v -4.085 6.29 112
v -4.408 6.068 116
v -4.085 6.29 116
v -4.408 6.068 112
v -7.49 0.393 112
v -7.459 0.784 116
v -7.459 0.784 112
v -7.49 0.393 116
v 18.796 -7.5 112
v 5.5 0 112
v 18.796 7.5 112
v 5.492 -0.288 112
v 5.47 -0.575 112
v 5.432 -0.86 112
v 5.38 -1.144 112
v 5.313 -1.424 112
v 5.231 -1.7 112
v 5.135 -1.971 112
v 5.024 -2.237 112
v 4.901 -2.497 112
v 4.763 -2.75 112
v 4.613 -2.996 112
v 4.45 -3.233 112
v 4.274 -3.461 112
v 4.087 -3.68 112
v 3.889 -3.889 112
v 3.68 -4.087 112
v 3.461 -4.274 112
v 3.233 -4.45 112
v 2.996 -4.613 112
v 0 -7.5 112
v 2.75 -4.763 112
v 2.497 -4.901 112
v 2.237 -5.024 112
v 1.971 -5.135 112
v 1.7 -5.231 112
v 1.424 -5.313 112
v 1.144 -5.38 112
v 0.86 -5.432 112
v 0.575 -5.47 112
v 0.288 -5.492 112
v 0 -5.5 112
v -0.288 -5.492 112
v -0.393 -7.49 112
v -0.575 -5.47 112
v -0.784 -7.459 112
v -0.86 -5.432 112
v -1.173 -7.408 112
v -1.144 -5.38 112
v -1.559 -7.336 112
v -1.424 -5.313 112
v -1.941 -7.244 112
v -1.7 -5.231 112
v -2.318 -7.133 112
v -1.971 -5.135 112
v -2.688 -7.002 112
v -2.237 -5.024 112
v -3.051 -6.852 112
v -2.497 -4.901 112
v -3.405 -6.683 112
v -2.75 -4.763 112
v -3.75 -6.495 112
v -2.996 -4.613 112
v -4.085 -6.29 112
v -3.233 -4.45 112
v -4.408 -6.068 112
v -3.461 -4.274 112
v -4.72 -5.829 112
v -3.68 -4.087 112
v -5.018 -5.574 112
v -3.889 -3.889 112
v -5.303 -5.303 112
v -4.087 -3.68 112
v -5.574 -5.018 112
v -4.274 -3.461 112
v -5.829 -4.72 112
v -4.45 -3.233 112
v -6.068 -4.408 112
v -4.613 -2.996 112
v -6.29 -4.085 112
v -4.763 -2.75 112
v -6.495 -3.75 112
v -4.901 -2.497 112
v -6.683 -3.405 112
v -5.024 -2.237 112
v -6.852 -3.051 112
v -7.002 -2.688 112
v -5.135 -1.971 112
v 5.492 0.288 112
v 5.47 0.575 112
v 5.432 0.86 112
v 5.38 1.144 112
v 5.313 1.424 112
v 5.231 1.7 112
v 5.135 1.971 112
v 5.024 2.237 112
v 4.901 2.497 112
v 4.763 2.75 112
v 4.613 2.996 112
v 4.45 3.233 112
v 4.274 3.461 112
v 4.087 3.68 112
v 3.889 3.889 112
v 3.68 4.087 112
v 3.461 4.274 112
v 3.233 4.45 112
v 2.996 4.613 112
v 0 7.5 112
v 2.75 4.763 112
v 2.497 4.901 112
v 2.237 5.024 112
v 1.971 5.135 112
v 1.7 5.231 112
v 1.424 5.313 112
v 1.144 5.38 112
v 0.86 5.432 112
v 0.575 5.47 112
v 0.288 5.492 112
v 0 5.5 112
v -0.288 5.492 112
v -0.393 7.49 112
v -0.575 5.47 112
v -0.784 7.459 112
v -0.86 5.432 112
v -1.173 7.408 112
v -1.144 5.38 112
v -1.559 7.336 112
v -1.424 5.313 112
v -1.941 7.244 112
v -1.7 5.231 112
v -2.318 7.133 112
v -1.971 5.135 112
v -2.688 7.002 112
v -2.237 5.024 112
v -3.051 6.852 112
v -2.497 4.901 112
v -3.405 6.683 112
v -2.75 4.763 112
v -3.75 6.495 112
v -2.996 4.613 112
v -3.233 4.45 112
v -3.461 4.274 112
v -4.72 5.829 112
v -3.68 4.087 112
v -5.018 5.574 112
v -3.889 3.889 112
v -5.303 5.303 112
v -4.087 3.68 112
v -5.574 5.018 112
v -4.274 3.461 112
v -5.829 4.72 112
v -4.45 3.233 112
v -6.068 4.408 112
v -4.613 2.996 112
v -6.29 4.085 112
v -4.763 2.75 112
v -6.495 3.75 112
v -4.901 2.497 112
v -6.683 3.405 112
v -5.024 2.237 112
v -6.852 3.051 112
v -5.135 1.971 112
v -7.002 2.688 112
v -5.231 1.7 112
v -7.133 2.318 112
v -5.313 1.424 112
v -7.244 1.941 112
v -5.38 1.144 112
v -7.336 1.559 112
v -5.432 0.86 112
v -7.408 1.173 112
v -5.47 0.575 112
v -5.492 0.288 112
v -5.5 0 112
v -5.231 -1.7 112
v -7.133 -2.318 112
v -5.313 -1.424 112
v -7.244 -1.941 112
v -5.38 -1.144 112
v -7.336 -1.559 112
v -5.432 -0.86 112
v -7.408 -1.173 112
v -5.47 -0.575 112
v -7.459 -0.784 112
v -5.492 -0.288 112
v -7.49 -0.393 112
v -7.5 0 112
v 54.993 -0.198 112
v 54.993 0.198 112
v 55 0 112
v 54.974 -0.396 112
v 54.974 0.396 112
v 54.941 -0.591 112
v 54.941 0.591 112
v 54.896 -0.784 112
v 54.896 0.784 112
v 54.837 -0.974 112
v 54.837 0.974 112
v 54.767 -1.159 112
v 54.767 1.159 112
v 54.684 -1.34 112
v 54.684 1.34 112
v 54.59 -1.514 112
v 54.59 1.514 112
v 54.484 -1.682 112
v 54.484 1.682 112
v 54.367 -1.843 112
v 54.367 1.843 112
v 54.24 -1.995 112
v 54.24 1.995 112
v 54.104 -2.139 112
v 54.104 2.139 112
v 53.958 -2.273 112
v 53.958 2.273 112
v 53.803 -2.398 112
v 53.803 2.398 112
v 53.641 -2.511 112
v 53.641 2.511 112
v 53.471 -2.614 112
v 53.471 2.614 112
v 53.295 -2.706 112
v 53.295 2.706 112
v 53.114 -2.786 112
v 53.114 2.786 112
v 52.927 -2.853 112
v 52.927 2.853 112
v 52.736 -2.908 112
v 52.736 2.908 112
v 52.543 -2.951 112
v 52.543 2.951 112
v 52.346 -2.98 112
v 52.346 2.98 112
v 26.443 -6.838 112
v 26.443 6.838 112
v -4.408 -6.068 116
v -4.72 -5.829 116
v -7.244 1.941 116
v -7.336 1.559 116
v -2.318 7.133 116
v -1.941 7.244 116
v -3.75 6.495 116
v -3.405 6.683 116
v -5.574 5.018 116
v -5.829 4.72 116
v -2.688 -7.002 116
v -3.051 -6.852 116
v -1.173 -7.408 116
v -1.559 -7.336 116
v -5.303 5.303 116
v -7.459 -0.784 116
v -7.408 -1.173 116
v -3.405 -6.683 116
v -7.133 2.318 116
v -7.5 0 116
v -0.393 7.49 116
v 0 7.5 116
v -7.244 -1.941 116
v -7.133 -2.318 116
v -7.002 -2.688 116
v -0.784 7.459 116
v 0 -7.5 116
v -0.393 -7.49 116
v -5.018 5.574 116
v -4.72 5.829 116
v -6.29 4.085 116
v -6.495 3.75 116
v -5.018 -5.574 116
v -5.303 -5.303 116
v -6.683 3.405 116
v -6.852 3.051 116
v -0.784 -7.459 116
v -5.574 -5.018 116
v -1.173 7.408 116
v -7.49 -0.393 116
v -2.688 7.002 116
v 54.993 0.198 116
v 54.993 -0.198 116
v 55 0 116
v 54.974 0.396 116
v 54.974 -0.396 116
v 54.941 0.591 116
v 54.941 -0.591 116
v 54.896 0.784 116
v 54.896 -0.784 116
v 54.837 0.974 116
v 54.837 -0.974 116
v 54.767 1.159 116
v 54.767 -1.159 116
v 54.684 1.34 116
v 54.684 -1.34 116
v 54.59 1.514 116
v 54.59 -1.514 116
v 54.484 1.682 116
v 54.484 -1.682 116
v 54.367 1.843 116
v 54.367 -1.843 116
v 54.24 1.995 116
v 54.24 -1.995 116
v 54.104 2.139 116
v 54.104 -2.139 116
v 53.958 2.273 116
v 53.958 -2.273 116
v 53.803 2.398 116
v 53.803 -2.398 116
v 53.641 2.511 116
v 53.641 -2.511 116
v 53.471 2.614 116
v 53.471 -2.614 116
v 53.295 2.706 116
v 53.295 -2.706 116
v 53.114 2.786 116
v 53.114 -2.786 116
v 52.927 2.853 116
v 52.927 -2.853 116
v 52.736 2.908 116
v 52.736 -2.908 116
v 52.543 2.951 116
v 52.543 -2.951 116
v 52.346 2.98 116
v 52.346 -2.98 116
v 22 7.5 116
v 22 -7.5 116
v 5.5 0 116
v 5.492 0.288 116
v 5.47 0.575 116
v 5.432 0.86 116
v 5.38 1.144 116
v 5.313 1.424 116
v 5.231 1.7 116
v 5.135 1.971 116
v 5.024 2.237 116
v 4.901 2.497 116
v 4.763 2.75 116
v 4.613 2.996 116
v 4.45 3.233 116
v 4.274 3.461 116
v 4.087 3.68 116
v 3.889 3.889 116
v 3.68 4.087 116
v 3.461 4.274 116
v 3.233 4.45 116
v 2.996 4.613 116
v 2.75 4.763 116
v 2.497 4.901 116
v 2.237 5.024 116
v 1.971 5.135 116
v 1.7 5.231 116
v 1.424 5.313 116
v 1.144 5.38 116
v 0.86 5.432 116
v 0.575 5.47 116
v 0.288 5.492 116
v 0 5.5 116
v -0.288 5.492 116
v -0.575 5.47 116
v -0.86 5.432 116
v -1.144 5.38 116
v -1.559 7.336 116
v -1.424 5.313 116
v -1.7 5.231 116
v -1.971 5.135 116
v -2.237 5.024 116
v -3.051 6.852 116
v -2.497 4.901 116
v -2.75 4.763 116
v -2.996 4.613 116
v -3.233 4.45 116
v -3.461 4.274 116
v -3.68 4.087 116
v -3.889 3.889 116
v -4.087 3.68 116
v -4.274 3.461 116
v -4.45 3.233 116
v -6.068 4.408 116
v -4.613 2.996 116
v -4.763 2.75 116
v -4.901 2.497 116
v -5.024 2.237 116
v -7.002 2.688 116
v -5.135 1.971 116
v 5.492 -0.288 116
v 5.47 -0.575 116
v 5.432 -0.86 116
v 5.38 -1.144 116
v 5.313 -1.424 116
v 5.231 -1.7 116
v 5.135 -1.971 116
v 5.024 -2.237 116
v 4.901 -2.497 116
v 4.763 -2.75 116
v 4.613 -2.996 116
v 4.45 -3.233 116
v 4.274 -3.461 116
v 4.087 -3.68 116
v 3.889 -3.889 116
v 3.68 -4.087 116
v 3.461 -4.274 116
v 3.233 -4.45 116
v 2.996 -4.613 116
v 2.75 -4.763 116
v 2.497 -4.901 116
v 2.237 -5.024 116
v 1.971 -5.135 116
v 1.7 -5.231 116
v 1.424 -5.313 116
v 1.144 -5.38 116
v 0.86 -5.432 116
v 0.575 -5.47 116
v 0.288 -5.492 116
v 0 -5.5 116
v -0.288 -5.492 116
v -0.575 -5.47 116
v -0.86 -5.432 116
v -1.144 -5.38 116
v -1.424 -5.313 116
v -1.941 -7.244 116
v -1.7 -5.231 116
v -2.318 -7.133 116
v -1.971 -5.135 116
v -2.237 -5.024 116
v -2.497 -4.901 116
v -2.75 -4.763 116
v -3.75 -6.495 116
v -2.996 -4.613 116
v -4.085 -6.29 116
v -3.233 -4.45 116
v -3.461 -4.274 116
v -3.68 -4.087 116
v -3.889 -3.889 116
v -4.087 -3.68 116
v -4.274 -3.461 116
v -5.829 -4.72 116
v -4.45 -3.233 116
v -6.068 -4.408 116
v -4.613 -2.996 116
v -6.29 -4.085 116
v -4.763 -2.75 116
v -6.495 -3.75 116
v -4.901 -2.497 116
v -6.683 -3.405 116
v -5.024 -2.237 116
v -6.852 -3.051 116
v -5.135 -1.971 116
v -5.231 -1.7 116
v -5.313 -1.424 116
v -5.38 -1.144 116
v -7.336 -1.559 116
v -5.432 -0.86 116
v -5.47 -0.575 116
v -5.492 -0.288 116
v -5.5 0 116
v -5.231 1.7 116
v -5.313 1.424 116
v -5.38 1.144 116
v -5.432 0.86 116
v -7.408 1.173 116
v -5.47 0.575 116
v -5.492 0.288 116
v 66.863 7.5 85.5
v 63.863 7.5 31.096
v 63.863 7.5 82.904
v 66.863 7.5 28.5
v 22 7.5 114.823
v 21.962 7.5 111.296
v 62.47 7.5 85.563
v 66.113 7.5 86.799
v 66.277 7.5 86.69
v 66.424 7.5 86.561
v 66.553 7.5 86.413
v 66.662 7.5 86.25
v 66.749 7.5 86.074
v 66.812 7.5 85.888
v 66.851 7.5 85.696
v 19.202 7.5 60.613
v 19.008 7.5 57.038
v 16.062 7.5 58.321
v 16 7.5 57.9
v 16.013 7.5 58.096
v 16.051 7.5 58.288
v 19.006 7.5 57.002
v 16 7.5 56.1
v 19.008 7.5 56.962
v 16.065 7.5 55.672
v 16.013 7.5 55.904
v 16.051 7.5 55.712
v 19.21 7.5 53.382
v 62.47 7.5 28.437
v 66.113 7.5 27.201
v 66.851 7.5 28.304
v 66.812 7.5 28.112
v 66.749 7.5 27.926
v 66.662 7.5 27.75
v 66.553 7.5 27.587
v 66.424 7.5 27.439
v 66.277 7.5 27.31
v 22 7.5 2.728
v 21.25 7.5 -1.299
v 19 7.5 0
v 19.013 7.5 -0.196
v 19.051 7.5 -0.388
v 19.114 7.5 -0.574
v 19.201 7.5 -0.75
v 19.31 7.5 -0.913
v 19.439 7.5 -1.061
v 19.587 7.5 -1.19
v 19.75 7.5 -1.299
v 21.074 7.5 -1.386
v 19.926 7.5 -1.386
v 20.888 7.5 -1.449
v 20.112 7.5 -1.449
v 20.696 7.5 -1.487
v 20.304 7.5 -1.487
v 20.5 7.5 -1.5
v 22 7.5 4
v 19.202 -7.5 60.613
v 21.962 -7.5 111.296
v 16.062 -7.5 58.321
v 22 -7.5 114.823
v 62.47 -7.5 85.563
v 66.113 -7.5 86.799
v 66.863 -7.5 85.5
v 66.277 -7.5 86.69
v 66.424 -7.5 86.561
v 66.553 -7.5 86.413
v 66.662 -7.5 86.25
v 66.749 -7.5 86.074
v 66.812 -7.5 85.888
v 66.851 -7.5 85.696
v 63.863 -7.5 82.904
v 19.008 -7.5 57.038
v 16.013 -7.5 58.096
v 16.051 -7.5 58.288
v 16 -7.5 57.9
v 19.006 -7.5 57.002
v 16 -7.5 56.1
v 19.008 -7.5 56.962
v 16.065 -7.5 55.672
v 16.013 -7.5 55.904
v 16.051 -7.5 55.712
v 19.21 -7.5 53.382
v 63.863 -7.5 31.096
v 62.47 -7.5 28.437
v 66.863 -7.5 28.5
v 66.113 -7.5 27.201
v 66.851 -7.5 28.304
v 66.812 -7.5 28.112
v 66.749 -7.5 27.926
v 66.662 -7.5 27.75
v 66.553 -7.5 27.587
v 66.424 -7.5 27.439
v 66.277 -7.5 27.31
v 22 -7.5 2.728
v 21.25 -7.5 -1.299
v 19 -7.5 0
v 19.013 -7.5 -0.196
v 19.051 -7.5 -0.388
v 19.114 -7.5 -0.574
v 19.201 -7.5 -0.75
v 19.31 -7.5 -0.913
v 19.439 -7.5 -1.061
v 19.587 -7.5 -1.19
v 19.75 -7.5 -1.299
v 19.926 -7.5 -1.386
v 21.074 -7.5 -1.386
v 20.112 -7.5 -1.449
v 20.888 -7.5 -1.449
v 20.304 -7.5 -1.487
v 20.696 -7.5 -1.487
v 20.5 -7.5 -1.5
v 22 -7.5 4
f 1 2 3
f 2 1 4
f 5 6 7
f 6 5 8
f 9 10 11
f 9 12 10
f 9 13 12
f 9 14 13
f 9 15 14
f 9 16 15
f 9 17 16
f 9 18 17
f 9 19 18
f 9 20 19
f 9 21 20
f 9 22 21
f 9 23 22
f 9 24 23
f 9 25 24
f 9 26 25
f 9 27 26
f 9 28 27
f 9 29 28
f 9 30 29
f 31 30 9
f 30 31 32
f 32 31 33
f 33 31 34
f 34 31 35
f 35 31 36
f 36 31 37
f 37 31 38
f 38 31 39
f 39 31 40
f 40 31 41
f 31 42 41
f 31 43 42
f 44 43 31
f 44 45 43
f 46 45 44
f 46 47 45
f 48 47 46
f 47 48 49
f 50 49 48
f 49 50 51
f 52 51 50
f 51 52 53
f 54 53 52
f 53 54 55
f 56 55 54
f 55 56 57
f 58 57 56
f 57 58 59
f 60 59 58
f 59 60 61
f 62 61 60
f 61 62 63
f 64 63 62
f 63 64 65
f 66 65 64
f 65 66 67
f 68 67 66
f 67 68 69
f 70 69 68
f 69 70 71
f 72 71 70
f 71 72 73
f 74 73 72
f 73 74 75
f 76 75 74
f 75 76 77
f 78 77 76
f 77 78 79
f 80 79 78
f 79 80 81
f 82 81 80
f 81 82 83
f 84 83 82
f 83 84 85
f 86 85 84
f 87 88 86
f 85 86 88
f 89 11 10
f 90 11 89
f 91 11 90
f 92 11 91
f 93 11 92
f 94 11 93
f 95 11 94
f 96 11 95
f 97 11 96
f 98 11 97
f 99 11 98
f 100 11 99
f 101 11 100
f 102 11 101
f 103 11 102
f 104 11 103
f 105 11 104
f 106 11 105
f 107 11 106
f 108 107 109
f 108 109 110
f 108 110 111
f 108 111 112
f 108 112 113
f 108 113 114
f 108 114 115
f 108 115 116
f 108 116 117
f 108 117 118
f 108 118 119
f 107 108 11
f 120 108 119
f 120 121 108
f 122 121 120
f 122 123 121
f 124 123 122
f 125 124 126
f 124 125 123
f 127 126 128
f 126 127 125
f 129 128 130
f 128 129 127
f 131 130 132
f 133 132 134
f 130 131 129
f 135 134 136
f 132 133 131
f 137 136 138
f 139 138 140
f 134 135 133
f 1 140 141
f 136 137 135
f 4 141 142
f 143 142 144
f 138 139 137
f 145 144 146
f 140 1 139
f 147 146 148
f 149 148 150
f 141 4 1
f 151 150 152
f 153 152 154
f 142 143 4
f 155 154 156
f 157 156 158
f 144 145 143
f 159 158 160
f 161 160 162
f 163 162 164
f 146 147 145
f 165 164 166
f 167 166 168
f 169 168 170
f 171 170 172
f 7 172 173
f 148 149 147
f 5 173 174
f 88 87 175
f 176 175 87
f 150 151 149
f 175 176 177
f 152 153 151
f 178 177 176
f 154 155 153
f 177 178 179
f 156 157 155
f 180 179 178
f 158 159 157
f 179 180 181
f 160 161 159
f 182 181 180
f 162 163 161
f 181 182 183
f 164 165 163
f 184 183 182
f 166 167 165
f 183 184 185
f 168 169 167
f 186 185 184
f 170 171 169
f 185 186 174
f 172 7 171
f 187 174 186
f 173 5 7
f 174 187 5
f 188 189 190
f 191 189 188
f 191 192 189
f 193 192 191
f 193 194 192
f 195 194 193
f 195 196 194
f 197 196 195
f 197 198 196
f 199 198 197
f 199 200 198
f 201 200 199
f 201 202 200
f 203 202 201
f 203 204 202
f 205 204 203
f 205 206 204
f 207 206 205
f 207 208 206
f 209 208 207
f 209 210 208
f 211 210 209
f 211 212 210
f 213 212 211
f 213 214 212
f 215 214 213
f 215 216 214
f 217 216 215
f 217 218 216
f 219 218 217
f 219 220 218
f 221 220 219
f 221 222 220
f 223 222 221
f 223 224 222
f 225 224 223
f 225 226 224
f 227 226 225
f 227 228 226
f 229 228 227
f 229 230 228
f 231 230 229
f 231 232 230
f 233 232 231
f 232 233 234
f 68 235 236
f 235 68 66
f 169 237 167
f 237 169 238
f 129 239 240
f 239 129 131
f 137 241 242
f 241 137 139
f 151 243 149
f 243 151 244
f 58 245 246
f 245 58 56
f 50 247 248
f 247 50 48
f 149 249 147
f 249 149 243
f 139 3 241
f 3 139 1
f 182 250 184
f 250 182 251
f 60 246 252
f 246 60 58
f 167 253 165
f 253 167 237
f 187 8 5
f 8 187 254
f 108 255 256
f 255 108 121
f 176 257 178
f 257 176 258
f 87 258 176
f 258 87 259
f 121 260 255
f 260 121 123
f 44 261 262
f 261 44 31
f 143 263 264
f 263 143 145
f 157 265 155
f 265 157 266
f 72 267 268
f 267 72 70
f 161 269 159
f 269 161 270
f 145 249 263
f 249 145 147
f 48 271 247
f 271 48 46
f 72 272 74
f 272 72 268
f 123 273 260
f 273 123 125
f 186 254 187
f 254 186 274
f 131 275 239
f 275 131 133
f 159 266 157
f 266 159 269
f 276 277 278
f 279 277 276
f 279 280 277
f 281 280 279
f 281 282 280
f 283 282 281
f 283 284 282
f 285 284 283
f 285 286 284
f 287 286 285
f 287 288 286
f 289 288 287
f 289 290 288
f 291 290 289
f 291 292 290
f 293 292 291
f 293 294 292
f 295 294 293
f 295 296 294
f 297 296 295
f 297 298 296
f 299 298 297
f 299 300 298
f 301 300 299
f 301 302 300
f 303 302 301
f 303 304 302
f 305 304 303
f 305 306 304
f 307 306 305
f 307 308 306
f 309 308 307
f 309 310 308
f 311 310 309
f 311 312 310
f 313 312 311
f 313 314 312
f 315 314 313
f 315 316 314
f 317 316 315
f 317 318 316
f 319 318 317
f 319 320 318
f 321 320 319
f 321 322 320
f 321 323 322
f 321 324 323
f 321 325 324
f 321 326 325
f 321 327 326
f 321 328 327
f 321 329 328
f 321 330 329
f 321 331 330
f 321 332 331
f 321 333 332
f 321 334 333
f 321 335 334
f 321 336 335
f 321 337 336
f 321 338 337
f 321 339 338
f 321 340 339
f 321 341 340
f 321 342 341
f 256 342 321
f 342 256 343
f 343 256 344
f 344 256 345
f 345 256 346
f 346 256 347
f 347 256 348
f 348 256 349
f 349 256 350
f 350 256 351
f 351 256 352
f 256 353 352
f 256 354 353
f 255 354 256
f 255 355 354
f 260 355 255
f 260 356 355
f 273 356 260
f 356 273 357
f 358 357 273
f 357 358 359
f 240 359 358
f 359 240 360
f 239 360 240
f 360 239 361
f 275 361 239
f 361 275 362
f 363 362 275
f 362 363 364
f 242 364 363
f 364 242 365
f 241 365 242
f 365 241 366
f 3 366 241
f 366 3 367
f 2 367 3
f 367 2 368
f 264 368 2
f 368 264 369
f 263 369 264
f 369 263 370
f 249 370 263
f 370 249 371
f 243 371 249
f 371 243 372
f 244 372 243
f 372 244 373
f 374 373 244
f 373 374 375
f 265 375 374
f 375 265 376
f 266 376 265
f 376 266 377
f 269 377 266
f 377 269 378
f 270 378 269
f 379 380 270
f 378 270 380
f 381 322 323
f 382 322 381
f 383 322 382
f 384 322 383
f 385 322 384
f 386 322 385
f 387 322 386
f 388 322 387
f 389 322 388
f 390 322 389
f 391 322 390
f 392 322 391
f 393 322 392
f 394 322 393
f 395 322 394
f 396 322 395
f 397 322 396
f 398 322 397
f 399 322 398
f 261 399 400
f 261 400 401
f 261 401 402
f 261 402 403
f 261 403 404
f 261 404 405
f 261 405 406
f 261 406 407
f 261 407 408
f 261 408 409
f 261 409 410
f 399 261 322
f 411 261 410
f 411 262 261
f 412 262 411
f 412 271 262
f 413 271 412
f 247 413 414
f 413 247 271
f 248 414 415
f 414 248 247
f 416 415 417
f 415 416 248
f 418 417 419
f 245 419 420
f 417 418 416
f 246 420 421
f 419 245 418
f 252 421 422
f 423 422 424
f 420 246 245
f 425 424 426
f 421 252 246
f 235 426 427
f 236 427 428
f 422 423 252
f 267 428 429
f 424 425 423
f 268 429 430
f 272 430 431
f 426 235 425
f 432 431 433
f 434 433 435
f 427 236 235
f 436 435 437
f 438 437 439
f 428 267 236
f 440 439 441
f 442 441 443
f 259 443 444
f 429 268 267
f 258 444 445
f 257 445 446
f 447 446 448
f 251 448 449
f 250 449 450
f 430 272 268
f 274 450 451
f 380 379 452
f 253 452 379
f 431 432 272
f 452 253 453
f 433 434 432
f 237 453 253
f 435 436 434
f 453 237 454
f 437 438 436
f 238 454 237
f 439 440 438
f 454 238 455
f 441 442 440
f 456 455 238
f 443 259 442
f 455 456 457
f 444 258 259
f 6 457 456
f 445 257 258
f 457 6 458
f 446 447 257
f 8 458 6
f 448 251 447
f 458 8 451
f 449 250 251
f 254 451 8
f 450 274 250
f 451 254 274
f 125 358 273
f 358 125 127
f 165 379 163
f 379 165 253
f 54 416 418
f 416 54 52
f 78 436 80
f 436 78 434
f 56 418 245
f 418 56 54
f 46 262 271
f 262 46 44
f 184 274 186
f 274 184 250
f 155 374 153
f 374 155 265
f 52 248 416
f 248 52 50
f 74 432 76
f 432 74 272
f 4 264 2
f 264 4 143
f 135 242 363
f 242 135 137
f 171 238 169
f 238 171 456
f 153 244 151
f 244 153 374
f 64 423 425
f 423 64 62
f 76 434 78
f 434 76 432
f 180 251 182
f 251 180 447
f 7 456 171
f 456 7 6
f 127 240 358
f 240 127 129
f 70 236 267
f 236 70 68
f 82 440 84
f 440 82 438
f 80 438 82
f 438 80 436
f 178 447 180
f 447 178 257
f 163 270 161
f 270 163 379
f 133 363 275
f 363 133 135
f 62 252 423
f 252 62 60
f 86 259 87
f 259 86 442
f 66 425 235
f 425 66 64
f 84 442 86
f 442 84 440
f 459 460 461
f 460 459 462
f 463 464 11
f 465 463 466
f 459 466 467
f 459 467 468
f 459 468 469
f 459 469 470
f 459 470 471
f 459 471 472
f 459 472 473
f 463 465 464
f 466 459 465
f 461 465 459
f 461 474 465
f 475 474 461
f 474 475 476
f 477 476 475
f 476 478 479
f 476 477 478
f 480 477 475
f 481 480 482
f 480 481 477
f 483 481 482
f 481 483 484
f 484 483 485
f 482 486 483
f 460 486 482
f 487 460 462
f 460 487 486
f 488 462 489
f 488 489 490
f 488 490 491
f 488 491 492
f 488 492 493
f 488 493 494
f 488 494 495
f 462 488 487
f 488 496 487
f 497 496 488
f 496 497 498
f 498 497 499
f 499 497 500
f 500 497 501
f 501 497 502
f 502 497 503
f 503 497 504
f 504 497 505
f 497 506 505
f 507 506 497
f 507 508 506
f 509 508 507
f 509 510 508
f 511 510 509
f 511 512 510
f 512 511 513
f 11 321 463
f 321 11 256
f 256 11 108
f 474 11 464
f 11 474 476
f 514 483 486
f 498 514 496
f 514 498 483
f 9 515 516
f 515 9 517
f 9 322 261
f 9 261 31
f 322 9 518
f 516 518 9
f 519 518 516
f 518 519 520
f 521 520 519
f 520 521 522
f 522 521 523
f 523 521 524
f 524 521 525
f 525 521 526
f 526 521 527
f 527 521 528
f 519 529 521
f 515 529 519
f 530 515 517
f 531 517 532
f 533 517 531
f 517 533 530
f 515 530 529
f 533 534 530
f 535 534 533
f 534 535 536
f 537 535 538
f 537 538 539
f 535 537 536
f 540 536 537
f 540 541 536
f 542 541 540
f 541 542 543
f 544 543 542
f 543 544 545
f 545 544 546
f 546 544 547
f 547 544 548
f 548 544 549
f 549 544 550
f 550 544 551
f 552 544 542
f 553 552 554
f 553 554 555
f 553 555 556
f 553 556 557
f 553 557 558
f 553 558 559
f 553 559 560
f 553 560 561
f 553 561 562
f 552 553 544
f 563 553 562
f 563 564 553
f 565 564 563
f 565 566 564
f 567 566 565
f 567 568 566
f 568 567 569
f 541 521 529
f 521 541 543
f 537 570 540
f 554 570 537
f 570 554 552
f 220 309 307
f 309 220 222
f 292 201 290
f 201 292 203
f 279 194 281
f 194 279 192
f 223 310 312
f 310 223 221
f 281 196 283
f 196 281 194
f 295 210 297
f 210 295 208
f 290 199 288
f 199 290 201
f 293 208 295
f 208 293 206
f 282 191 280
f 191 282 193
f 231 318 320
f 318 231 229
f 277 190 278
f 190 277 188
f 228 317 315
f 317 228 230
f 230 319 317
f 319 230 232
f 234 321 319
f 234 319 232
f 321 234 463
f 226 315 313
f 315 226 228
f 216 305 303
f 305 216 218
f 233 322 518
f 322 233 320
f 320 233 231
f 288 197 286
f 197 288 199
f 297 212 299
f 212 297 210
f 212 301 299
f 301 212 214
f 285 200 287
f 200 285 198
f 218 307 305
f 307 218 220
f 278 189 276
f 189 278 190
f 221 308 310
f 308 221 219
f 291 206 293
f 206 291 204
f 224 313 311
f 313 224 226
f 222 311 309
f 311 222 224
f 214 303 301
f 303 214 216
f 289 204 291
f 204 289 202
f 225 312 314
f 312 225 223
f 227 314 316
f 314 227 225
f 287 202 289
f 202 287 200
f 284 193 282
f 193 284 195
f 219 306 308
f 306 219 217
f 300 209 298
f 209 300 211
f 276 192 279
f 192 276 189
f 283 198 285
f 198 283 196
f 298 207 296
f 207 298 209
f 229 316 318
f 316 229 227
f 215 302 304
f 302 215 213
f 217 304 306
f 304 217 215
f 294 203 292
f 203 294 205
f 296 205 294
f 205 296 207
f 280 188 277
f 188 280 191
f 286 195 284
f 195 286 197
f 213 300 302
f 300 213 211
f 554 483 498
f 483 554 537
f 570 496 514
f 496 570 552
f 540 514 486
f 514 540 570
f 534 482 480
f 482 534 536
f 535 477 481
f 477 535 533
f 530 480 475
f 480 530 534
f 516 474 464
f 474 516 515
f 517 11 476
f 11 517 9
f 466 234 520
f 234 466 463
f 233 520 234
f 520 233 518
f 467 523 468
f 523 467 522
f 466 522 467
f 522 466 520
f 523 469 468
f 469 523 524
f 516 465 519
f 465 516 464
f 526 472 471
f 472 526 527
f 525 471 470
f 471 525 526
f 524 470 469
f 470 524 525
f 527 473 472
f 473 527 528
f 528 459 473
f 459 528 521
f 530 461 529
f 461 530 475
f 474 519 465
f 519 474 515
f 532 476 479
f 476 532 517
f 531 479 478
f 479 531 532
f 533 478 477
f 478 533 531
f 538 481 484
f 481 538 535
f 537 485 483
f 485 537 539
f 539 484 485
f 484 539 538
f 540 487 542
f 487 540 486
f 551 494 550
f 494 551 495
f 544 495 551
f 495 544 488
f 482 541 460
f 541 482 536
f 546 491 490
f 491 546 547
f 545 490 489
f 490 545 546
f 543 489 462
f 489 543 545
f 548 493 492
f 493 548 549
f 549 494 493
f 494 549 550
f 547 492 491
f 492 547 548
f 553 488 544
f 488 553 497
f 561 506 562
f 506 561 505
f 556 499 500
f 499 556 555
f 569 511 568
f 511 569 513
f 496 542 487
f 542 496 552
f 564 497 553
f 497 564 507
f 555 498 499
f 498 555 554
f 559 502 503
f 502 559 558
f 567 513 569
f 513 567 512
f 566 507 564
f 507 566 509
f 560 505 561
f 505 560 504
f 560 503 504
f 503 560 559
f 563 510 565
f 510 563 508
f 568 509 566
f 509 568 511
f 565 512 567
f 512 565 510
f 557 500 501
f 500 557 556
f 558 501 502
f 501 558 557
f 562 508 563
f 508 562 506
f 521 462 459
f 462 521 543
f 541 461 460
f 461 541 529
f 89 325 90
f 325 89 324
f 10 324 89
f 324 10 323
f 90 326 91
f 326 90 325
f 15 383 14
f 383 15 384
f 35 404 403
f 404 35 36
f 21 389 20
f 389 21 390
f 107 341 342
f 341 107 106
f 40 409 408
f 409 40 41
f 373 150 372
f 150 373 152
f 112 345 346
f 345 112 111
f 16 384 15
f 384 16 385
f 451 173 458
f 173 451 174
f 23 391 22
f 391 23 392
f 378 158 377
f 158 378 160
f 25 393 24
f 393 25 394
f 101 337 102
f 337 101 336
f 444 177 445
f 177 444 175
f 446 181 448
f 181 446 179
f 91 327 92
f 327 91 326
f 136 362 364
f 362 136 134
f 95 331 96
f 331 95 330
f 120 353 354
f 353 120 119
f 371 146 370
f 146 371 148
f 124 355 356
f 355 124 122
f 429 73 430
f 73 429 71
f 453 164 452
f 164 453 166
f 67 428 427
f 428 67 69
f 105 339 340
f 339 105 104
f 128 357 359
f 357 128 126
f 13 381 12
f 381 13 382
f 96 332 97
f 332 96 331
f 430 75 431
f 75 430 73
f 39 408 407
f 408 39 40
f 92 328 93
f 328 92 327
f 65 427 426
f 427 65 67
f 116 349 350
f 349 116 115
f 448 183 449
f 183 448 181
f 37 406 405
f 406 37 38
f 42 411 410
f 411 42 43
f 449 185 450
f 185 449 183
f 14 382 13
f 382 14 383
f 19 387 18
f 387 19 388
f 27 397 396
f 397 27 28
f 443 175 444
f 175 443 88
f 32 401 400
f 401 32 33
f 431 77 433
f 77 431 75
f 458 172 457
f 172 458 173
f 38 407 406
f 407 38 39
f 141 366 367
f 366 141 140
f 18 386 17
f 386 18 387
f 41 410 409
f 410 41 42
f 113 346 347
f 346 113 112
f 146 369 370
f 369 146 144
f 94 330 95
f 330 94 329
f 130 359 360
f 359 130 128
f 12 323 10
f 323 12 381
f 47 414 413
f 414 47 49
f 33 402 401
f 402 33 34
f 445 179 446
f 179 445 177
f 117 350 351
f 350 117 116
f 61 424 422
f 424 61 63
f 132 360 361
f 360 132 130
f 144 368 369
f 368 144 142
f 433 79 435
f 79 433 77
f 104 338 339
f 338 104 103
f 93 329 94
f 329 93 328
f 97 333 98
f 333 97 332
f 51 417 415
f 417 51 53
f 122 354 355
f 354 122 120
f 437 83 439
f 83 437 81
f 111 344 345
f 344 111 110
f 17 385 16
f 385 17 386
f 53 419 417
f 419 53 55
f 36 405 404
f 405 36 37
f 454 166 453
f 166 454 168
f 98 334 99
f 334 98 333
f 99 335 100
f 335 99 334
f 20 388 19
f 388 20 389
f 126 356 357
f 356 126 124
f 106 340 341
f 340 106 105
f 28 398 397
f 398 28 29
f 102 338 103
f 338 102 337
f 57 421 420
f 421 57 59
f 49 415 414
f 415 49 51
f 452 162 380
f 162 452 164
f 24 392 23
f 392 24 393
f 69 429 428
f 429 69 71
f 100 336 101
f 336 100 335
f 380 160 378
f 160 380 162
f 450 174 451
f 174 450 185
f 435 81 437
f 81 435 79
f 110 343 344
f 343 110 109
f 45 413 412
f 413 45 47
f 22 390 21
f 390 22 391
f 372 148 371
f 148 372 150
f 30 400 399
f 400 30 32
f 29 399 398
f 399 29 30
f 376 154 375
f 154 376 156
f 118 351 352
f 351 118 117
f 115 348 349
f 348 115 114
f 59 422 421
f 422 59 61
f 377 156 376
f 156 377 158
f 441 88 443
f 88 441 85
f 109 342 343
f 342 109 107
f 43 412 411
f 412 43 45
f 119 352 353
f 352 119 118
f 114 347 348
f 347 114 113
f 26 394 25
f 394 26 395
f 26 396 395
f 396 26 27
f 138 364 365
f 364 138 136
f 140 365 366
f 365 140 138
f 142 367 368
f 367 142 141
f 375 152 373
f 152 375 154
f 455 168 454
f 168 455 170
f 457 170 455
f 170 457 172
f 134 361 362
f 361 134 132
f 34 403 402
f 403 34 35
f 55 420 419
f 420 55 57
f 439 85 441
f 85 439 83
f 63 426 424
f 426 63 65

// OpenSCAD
// file: ../common/common.scad
// (C) 2023 Dmytry Lavrov

module box(low, high){
    translate(low){
        cube(high-low);
    }
}

module mirror_duplicate(v){
    children();
    mirror(v=v)children();
}

module x_mirror(){
    mirror_duplicate(v=[1,0,0])children();
}
module y_mirror(){
    mirror_duplicate(v=[0,1,0])children();
}
module xy_mirror(){
    mirror_duplicate(v=[1,0,0])mirror_duplicate(v=[0,1,0])children();
}

module four_corners(low, high){
    translate([low[0], low[1], 0])children();
    translate([high[0], low[1], 0])children();
    translate([high[0], high[1], 0])children();
    translate([low[0], high[1], 0])children();  
}

module cyl_rounded_box(low, high, r){
    h=high[2]-low[2];
    translate([0, 0, low[2]]){
        hull(){
            translate([low[0]+r, low[1]+r, 0])cylinder(h, r=r);
            translate([high[0]-r, low[1]+r, 0])cylinder(h, r=r);
            translate([high[0]-r, high[1]-r, 0])cylinder(h, r=r);
            translate([low[0]+r, high[1]-r, 0])cylinder(h, r=r);
        }
    }
}

module rounded_box(l, h, r){
    hull(){
        translate([l[0]+r, l[1]+r, l[2]+r])sphere(r);        
        translate([l[0]+r, l[1]+r, h[2]-r]) sphere(r);
        translate([l[0]+r, h[1]-r, l[2]+r]) sphere(r);
        translate([l[0]+r, h[1]-r, h[2]-r]) sphere(r);
        
        translate([h[0]-r, l[1]+r, l[2]+r]) sphere(r);
        translate([h[0]-r, l[1]+r, h[2]-r]) sphere(r);
        translate([h[0]-r, h[1]-r, l[2]+r]) sphere(r);
        translate([h[0]-r, h[1]-r, h[2]-r]) sphere(r);
    }
}

module skel_cyl_rounded_box(low, high, ir, or, outer=true, right_side=true){
    h=high[2]-low[2];
    translate([0, 0, low[2]])
    difference(){
        union(){
            translate([low[0], low[1], 0])cylinder(h, r=or);
            translate([high[0], low[1], 0])cylinder(h, r=or);
            translate([high[0], high[1], 0])cylinder(h, r=or);
            translate([low[0], high[1], 0])cylinder(h, r=or);
            // outer shell
            if(outer){
                box([low[0], low[1]-or, 0], [high[0], low[1]-ir, h]);            
                box([low[0], high[1]+ir, 0], [high[0], high[1]+or, h]);
                
                box([low[0]-or, low[1], 0], [low[0]-ir, high[1], h]);
                
                if(right_side)box([high[0]+ir, low[1], 0], [high[0]+or, high[1], h]);
            }

            // inner shell            
            box([low[0], low[1]+ir, 0], [high[0], low[1]+or, h]);            
            box([low[0], high[1]-or, 0], [high[0], high[1]-ir, h]);
            
            box([low[0]+ir, low[1], 0], [low[0]+or, high[1], h]);
            box([high[0]-or, low[1], 0], [high[0]-ir, high[1], h]);
        }
        translate([low[0], low[1], 0])cylinder(h, r=ir);
        translate([high[0], low[1], 0])cylinder(h, r=ir);
        translate([high[0], high[1], 0])cylinder(h, r=ir);
        translate([low[0], high[1], 0])cylinder(h, r=ir);
    }
}

module sequential_hull(){
    if($children<2){
        hull()children();
    }else{
        for (i = [0: $children-2])
            hull(){
                children(i);
                children(i+1);
            }
    }
}

module teardrop(r){// sphere with a hat, purpose: avoid overhangs
    union(){
        sphere(r);
        translate([0,0,r*sqrt(0.5)])cylinder(r*sqrt(0.5), r1=r*sqrt(0.5), r2=0);
    }
}

module up(z){
    translate([0,0,z])children();
}
// main file
// (C) 2023 Dmytry Lavrov.
use <../common/common.scad>

$fa=3;
$fs=0.2;
print_dilation=0.15;// when printing the shape gets dilated typically by 0.15mm
print_dilation_max=0.3;// max 0.3
tight_fit=0.2;
large=1000;
support_thickness=0.4;

hotend_h=55;

hotend_tip=5;
hotend_clearance=16;


bearing_or=11/2;
bearing_h=4;
t=2;

bar_t=3;

bar_h=hotend_h+bearing_h/2;

back_l=30;


module hotend_mechanism(){
    w=bearing_or+t;
    module cyl(x, z){
        translate([x, 0, z])rotate([90,0,0])cylinder(2*w, r=0.5*bar_t, center=true);
    }
    difference(){
        union(){
            up(2*bar_h-bearing_h/2){
                cylinder(bearing_h, r=bearing_or+t);
                box([0, -w, 0], [hotend_clearance+bar_t*2, w, bearing_h]);
                hull(){
                    box([0, -w, 0], [hotend_clearance+2*bar_t, w, bearing_h]);
                    translate([hotend_clearance+2*bar_t+back_l, 0, 0])cylinder(bearing_h, r=t+1);
                }
            }
            
            sequential_hull(){
                box([hotend_clearance+bar_t, -w, 0], [hotend_clearance+bar_t*2, w, bearing_h]);
                box([hotend_clearance, -w, bar_h-0.1], [hotend_clearance+bar_t, w, bar_h+0.1]);
                box([hotend_clearance+bar_t, -w, 2*bar_h-0.5*bearing_h], [hotend_clearance+bar_t*2, w, 2*bar_h+0.5*bearing_h]);
                
            }
            sequential_hull(){
                cyl(hotend_clearance+bar_t*1.5, bar_h*2);
                cyl(hotend_clearance+bar_h*sin(60), bar_h*1.5);
                cyl(hotend_clearance+bar_t*0.5, bar_h+bar_t*0.3);
                cyl(hotend_clearance+bar_t*0.5, bar_h-bar_t*0.3);
                cyl(hotend_clearance+bar_h*sin(60), bar_h*0.5);
                cyl(hotend_clearance+bar_t*1.5, 0);
            }
            hull(){
                cyl(hotend_clearance+bar_h*sin(60), bar_h*1.5);
                cyl(hotend_clearance+bar_h*sin(60), bar_h*0.5);
            }
        }

        up(-0.5)cylinder(large, r=bearing_or);
    }
}

hotend_mechanism();
